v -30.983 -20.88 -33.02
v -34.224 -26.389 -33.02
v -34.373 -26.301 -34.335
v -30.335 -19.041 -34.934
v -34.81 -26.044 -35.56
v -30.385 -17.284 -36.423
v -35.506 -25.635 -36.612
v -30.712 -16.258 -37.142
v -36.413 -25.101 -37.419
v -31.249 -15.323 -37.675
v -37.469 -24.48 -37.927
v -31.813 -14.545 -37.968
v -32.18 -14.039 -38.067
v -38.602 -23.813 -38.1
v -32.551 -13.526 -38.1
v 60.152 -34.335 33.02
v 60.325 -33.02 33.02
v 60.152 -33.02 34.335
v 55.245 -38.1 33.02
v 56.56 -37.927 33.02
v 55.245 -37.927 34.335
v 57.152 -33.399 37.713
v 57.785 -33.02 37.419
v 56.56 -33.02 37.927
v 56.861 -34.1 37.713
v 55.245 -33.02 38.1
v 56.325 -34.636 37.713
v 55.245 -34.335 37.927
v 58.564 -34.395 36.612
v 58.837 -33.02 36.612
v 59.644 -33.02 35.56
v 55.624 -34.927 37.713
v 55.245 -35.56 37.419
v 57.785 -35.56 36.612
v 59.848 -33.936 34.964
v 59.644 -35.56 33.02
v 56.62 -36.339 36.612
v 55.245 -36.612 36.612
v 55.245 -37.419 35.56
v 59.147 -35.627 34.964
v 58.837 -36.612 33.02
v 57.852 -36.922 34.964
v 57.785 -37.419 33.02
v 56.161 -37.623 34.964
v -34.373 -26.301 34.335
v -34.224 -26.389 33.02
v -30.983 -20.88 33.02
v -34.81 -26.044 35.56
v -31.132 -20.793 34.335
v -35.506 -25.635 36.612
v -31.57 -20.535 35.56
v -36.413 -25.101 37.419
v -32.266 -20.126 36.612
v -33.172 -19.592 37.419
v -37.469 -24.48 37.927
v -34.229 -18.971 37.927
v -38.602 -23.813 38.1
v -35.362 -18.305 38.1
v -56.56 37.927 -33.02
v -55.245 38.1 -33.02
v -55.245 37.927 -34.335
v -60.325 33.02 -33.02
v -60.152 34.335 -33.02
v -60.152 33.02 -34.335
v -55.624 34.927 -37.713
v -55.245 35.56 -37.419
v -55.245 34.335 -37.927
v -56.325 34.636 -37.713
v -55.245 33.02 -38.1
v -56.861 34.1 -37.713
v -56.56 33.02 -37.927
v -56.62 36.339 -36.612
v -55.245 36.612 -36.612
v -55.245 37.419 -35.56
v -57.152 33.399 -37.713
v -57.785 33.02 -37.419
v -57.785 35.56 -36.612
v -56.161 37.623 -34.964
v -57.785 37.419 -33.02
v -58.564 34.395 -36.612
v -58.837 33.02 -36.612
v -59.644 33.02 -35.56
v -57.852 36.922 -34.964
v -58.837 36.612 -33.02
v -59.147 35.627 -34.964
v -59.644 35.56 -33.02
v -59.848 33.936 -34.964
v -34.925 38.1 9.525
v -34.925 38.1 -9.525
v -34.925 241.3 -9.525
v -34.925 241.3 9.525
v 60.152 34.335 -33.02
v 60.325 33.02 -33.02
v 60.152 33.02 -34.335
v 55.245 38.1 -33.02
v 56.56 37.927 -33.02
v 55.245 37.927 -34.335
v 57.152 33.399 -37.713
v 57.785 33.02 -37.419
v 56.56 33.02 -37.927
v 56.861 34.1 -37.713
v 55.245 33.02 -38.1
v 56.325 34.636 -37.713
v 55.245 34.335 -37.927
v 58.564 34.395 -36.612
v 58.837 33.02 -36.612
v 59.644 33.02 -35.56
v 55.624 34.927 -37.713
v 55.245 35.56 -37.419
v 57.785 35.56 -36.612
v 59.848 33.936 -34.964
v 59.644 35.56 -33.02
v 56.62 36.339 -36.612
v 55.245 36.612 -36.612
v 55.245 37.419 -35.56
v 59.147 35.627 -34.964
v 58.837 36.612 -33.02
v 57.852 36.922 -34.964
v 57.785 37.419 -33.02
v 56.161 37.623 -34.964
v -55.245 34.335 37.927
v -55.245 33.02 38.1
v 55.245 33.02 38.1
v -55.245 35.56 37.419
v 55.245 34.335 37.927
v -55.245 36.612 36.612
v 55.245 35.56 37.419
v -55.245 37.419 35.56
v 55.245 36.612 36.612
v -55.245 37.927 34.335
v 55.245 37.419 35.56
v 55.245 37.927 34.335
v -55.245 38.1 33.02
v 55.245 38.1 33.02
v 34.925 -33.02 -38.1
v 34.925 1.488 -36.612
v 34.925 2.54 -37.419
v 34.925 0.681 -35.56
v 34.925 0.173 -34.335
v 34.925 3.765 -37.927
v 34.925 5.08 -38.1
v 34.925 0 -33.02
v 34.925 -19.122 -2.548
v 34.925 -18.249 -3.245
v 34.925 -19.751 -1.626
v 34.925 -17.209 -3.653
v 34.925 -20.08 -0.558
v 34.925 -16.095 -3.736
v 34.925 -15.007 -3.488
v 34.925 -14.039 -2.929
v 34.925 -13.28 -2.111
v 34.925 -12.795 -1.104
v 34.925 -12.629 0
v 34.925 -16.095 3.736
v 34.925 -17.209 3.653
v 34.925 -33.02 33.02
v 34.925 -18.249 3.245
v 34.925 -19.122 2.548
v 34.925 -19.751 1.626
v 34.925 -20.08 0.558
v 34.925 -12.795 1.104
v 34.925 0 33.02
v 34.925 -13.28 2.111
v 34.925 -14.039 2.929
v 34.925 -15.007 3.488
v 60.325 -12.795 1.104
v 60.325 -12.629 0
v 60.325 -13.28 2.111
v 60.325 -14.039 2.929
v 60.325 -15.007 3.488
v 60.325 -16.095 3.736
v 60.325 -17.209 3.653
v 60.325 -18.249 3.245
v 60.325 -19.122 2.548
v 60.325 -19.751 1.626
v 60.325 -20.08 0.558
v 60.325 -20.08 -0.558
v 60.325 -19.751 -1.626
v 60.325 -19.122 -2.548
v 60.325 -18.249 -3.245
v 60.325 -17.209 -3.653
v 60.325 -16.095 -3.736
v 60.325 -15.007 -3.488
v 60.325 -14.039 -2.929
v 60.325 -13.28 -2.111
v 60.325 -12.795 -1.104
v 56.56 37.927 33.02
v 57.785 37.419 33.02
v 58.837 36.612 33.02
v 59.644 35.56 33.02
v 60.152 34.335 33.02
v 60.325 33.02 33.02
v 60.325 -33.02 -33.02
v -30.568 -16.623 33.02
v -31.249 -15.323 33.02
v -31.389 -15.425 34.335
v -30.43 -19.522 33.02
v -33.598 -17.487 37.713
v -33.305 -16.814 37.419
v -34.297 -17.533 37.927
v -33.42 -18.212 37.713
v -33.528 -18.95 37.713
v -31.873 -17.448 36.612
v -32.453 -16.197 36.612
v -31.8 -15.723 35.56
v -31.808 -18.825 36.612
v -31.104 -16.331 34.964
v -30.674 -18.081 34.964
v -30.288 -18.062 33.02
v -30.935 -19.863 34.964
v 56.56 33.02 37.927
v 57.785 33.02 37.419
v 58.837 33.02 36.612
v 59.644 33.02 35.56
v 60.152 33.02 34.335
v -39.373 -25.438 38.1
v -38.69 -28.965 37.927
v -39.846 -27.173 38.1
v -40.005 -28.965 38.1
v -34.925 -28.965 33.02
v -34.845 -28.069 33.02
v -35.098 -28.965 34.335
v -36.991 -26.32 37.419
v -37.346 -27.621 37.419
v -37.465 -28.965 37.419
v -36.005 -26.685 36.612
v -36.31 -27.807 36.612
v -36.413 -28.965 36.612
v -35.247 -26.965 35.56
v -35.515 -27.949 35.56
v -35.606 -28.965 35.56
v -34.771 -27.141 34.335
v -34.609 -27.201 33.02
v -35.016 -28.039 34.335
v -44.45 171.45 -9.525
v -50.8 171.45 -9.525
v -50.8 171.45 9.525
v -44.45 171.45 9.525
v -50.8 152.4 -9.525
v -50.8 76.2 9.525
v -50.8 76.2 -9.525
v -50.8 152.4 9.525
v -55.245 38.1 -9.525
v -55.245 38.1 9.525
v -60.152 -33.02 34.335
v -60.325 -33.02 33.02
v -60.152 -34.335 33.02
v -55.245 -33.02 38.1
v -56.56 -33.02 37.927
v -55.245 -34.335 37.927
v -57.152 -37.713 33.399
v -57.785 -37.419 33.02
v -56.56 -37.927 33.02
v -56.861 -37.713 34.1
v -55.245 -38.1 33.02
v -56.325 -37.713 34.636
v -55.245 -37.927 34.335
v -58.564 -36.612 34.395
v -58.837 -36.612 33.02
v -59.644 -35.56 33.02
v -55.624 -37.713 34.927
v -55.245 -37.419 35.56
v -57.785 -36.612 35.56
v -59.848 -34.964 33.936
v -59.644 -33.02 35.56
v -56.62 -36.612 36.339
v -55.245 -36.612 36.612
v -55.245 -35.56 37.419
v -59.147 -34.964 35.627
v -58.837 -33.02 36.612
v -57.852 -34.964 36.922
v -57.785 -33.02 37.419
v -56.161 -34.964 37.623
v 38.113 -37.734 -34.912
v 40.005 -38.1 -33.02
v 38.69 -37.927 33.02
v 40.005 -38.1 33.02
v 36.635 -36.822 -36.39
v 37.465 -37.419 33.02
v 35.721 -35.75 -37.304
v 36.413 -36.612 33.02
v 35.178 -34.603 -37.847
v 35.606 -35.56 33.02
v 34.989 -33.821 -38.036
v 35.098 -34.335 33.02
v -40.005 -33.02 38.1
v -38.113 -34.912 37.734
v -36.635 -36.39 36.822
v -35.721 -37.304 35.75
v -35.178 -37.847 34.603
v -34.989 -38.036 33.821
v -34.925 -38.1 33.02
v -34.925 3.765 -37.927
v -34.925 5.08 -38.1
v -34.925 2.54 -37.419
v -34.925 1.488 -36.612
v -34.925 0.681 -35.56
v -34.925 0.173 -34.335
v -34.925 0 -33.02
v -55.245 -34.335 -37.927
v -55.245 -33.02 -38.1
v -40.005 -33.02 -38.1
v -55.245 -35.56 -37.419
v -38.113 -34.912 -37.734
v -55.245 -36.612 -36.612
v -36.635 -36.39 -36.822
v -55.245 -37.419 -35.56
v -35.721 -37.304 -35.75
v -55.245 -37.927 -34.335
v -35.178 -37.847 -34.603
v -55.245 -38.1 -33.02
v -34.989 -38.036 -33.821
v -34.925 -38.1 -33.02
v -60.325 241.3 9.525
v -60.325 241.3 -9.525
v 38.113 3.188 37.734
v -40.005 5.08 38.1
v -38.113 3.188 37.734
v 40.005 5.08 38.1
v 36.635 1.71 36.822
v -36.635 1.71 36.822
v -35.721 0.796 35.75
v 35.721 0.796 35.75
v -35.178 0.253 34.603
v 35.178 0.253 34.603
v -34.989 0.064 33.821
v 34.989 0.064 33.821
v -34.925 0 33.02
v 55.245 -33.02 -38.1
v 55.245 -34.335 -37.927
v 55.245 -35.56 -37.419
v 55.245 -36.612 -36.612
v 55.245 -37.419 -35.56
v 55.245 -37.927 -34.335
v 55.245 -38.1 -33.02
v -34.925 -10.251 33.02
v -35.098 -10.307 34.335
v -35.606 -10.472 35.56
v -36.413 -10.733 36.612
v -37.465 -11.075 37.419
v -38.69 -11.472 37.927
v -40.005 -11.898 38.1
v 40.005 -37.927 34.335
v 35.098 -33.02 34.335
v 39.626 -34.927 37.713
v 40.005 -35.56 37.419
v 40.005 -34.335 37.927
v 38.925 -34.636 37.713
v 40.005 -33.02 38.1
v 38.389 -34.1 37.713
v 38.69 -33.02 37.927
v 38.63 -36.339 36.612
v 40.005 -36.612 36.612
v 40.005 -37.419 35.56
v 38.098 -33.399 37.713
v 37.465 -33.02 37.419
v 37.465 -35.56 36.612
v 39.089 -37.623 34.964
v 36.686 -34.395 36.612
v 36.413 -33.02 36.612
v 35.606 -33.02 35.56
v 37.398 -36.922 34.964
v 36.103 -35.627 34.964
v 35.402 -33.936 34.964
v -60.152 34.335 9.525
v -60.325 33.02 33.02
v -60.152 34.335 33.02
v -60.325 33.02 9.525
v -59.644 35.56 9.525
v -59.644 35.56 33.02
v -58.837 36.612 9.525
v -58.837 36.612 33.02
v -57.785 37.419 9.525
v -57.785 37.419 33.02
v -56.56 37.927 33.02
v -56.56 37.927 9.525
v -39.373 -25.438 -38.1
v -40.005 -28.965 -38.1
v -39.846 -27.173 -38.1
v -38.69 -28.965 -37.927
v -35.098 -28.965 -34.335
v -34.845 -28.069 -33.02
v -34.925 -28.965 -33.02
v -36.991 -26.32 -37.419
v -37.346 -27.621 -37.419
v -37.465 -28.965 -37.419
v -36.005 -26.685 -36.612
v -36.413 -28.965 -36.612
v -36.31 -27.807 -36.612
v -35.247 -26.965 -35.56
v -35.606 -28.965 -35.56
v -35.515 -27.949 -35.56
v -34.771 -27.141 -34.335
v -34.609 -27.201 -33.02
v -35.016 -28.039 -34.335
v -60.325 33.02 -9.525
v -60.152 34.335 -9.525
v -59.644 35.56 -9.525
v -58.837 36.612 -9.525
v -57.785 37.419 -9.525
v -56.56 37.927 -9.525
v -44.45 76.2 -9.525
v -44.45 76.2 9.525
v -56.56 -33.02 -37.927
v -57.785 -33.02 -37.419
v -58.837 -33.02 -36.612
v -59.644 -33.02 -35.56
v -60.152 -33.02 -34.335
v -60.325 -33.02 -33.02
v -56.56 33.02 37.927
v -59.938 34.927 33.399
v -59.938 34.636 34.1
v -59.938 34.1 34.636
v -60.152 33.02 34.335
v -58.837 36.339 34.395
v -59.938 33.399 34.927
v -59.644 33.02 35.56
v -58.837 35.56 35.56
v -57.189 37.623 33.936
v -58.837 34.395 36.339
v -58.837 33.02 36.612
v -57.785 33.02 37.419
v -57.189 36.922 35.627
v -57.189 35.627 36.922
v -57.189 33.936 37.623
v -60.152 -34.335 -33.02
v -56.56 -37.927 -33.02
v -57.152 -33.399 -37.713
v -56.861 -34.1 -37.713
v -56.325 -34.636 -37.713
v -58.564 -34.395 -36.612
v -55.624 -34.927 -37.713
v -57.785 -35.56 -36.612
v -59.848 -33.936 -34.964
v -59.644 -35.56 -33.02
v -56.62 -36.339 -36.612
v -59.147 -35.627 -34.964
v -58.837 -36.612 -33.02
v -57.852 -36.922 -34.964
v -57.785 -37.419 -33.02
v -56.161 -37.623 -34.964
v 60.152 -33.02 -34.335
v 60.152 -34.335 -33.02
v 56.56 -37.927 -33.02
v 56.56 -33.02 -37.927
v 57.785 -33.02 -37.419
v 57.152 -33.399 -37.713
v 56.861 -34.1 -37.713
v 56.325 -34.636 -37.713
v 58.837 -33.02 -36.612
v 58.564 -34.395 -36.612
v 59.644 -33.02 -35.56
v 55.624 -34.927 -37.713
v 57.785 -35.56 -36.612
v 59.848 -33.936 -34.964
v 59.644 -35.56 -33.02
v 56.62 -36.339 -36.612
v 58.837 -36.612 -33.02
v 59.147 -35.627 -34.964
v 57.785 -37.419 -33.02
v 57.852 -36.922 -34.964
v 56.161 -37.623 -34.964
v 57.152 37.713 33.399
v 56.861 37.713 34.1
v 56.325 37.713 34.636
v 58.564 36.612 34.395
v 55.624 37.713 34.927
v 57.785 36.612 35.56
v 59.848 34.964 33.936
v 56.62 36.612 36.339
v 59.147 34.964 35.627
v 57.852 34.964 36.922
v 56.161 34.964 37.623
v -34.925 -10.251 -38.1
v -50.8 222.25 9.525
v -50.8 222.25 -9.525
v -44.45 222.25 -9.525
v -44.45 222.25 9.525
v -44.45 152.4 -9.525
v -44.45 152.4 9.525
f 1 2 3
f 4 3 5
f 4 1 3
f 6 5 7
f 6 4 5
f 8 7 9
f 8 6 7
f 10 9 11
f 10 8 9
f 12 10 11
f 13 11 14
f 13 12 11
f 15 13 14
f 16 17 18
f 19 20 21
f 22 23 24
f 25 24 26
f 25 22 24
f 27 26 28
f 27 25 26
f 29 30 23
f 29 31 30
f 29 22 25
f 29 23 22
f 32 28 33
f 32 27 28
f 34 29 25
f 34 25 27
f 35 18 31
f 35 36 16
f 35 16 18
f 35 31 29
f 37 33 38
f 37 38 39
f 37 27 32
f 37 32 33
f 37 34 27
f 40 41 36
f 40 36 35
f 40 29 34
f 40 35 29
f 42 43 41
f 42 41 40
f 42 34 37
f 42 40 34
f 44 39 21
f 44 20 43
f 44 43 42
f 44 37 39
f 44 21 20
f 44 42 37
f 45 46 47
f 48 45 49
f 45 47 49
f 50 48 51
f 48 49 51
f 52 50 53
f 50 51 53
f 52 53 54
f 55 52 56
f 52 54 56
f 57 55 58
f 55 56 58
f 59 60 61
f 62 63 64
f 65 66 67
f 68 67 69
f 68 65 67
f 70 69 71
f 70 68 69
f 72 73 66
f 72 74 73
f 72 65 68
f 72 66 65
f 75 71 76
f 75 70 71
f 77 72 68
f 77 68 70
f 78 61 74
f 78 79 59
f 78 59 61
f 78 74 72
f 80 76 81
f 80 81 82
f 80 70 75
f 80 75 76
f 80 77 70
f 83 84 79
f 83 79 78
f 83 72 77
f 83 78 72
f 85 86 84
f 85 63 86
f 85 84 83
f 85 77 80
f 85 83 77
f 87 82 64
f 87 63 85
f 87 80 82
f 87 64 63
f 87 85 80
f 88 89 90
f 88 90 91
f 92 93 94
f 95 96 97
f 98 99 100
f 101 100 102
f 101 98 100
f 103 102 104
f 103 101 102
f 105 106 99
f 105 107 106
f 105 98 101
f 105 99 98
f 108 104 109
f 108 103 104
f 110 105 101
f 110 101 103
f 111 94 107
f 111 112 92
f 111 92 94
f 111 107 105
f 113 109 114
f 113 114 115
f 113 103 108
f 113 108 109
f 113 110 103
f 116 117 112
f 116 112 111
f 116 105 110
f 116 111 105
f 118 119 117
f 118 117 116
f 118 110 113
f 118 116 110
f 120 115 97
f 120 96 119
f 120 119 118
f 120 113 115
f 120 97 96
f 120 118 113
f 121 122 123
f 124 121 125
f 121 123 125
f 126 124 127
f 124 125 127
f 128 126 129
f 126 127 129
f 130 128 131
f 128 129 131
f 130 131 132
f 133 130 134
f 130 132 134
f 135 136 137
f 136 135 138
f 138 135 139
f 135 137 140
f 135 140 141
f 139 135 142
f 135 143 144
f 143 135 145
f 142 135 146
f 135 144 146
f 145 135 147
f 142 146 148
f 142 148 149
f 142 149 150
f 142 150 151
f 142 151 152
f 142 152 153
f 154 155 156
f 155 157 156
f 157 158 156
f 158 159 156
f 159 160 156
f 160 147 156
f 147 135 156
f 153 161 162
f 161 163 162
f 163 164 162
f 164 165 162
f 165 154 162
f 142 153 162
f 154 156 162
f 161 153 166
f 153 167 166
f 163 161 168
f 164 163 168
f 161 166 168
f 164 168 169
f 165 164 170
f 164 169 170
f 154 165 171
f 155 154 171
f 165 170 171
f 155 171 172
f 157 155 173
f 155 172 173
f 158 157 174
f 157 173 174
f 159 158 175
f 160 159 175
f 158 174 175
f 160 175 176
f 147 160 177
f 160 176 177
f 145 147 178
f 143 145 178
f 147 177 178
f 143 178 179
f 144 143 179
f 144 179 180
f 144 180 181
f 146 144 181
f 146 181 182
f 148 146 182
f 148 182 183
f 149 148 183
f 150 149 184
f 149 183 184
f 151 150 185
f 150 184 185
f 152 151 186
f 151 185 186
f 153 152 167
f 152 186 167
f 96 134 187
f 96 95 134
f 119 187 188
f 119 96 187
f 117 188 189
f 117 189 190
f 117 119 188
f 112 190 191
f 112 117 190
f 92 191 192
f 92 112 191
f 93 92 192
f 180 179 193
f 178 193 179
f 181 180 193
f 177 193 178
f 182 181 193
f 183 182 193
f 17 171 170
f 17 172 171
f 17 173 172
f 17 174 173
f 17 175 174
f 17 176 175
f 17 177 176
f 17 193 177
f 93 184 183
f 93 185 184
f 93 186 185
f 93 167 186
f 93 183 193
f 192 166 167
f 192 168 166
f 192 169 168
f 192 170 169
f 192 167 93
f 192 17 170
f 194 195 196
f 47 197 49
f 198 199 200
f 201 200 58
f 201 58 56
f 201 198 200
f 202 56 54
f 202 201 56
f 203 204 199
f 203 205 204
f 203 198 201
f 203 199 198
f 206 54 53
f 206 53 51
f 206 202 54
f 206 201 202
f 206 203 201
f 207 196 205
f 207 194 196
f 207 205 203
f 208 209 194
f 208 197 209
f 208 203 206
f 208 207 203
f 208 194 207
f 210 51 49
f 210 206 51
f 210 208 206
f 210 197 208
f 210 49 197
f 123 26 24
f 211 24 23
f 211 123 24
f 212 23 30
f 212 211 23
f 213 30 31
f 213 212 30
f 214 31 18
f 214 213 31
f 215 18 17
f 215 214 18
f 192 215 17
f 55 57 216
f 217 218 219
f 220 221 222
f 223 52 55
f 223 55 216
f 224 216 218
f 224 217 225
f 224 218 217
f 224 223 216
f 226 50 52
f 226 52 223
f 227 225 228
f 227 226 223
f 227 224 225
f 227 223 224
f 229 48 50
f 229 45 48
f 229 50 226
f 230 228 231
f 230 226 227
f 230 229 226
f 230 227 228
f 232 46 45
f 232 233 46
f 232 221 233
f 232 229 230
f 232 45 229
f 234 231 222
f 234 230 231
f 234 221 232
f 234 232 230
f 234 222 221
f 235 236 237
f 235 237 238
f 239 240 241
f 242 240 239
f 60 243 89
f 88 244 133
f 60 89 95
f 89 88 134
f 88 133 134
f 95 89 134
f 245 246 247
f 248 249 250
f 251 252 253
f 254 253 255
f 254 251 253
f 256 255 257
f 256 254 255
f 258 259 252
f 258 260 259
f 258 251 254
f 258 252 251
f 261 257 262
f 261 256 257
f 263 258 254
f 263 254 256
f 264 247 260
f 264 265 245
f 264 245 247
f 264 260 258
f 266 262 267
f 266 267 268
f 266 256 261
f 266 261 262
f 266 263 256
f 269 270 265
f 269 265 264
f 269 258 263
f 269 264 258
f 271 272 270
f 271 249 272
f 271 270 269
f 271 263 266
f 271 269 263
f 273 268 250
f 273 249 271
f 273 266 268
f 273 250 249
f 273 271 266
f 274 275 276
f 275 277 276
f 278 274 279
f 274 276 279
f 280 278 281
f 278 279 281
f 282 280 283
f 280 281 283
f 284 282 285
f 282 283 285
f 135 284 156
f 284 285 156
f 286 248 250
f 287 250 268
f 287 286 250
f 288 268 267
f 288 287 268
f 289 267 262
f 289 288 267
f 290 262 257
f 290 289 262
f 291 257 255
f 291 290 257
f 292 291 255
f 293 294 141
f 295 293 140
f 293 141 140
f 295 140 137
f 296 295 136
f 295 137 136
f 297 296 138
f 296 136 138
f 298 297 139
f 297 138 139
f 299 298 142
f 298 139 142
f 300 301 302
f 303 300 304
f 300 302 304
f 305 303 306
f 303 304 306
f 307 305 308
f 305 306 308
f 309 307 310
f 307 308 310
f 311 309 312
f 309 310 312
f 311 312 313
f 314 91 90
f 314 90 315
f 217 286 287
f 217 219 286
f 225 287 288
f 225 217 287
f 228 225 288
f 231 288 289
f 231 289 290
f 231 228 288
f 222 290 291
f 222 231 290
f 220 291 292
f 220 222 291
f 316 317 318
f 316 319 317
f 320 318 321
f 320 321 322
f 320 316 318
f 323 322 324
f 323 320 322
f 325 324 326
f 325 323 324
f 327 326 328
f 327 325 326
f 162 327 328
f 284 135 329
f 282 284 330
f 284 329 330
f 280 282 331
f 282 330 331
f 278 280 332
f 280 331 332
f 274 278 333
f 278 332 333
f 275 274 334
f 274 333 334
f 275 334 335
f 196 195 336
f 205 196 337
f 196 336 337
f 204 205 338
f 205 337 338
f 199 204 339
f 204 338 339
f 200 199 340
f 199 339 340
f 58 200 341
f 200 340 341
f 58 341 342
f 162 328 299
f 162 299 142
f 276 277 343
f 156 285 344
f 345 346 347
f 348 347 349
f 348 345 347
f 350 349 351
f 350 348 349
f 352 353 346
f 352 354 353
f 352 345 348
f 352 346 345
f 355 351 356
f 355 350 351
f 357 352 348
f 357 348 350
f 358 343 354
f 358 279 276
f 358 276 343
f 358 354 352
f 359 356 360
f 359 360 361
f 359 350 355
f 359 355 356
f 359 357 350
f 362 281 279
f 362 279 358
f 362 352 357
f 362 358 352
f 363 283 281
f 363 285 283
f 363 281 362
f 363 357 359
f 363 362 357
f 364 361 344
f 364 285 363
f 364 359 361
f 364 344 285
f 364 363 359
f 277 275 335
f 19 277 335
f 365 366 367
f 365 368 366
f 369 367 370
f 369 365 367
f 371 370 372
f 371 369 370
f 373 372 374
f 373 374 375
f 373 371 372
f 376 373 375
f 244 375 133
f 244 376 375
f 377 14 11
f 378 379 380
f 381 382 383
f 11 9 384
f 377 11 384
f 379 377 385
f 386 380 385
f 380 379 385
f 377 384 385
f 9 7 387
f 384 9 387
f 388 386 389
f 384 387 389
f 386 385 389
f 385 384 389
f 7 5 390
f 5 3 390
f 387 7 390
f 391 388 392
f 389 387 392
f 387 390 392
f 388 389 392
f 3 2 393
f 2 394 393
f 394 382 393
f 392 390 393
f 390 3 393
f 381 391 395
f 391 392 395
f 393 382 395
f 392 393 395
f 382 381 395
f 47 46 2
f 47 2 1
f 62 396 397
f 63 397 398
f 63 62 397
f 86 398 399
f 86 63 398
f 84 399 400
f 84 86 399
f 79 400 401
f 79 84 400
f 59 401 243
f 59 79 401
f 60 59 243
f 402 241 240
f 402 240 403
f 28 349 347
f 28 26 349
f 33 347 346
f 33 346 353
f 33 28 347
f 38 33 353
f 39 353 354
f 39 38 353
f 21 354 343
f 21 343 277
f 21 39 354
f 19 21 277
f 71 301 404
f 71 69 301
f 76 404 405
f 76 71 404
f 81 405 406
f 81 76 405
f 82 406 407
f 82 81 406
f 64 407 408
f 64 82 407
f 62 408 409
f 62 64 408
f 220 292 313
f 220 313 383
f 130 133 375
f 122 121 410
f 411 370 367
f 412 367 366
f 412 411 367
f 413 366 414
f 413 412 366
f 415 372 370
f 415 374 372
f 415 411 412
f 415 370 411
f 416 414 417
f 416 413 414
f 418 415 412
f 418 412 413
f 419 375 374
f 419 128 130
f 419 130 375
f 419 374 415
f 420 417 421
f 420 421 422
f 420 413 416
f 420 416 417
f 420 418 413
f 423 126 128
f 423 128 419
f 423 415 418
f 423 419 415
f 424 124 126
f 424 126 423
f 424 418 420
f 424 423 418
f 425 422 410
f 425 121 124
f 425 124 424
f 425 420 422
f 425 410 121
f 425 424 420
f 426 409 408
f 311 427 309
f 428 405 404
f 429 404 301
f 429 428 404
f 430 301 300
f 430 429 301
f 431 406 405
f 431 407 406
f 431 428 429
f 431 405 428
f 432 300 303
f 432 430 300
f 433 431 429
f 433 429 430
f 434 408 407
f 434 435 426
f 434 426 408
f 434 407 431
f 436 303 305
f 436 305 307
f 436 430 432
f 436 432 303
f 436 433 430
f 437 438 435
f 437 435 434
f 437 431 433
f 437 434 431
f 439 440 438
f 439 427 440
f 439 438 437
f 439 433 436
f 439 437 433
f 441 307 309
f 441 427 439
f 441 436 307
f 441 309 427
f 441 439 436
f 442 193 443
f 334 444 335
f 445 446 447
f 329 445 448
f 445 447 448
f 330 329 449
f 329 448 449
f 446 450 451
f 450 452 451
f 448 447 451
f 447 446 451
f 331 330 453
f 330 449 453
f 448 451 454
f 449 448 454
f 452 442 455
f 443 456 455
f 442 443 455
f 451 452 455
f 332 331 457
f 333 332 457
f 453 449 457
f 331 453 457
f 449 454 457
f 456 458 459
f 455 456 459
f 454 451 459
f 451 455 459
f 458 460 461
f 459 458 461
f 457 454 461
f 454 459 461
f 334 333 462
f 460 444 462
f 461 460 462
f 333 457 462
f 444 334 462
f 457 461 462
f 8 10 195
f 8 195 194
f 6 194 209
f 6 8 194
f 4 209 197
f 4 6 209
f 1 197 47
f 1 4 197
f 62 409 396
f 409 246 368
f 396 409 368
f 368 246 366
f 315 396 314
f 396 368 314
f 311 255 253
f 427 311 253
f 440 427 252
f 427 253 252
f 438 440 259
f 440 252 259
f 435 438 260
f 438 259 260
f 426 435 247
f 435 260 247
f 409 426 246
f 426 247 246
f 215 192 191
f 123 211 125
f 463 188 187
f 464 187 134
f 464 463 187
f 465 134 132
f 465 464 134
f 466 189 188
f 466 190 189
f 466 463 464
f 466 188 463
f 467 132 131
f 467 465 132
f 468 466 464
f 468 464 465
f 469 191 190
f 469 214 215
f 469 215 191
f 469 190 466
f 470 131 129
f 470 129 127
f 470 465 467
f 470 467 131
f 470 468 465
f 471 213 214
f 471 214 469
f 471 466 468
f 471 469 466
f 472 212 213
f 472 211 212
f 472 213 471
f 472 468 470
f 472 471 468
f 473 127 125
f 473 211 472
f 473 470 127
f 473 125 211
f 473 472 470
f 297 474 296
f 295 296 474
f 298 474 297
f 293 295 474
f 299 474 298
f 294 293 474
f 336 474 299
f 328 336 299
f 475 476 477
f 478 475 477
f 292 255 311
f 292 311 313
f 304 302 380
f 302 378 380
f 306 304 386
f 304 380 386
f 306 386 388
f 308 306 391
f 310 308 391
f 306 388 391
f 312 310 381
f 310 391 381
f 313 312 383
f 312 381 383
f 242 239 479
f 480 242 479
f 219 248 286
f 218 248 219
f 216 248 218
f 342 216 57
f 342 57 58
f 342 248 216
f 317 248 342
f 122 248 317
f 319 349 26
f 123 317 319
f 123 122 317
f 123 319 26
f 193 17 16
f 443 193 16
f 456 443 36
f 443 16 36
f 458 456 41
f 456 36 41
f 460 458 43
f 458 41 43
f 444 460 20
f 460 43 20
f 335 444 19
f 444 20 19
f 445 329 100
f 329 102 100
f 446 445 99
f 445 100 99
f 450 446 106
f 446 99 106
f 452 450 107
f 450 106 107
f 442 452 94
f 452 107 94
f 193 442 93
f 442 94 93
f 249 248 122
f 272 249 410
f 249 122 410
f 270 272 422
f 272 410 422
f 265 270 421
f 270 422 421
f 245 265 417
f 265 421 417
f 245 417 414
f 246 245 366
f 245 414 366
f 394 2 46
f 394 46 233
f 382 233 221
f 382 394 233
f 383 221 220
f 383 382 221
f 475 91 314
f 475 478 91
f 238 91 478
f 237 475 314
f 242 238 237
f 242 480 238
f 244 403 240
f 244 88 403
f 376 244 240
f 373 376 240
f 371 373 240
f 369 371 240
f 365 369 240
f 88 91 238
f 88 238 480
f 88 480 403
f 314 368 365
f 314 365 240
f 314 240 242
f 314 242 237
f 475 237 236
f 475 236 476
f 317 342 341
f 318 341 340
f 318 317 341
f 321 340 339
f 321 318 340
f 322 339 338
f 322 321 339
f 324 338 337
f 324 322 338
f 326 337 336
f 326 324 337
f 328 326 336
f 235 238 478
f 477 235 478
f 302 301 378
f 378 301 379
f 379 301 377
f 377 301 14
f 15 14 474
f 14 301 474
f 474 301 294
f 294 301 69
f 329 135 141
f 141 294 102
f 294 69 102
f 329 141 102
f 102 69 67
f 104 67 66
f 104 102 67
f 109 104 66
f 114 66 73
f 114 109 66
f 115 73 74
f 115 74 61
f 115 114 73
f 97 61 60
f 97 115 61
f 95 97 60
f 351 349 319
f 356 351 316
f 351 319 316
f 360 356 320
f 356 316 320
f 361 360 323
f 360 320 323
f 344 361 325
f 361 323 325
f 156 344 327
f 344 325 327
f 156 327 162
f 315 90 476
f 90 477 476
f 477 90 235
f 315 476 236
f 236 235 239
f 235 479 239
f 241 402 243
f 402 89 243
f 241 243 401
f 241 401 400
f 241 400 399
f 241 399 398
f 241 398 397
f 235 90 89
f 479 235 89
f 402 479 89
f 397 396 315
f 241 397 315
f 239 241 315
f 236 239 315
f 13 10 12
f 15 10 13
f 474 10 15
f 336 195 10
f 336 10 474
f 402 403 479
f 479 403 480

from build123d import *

# Parameters (mm, degrees)
F0_W      = 120.65
F0_H      = 76.2
F2_DEPTH  = 38.1
F1_W      = 69.85
F1_H      = 101.6
F3_DEPTH  = 38.1
F4_R      = 3.7467551061
F5_DEPTH  = 38.1
F6_W      = 25.4
F6_H      = 19.05
F7_DEPTH  = 203.2
F8_W      = 6.35
F8_H      = 50.8
F8_H_2    = 76.2
F9_DEPTH  = 47.626
F11_DEPTH = 38.1
F12_R     = 5.08


with BuildPart() as f2:
    # F0 (on Top) → F2 (new body, symmetric)
    with BuildSketch(Plane.XY):
        Rectangle(F0_W, F0_H)
    extrude(amount=F2_DEPTH, both=True)

    # F1 (on face) → F3 (cut, symmetric)
    with BuildSketch(Plane.XY):
        with Locations((0, -50.8)):
            Rectangle(F1_W, F1_H)
    extrude(amount=F3_DEPTH, both=True, mode=Mode.SUBTRACT)

    # F4 (on face) → F5 (cut, symmetric)
    with BuildSketch(Plane.YZ.offset(60.325)):
        with Locations((-16.3753926754, 0)):
            Circle(F4_R)
    extrude(amount=F5_DEPTH, both=True, mode=Mode.SUBTRACT)

    # F6 (on face) → F7 (join)
    with BuildSketch(Plane(origin=(0, 38.1, 0), x_dir=(-1, 0, 0), z_dir=(0, 1, 0))):
        with Locations((47.625, 0)):
            Rectangle(F6_W, F6_H)
    extrude(amount=F7_DEPTH)

    # F8 (on face) → F9 (cut, through all)
    with BuildSketch(Plane.XY.offset(9.525)):
        with Locations((-47.625, 196.85)):
            Rectangle(F8_W, F8_H)
        with Locations((-47.625, 114.3)):
            Rectangle(F8_W, F8_H_2)
    extrude(amount=-F9_DEPTH, mode=Mode.SUBTRACT)

    # F10 (on Top) → F11 (join, symmetric)
    with BuildSketch(Plane.XY):
        Polygon((-29.2977448553, -18.0150475353), (-34.9880978465, -10.1638017222), (-35.0601263344, -27.8110988438), align=None)
    extrude(amount=F11_DEPTH, both=True)

    # F12
    f12_edges = [f2.edges().sort_by_distance(p)[0] for p in [
        (60.325, -38.1, 0),
        (60.325, 0, 38.1),
        (60.325, 38.1, 0),
        (60.325, 0, -38.1),
        (0, 38.1, 38.1),
        (-60.325, 38.1, 23.8125),
        (-60.325, 38.1, -23.8125),
        (0, 38.1, -38.1),
        (-60.325, 0, 38.1),
        (-60.325, -38.1, 0),
        (-60.325, 0, -38.1),
        (34.925, -38.1, 0),
        (-34.925, -27.581384, 0),
        (-32.111372, -22.798216, 38.1),
        (-29.297745, -18.015048, 0),
        (-32.111372, -22.798216, -38.1),
        (0, 0, 38.1),
        (0, 0, -38.1),
        (47.625, -38.1, 38.1),
        (47.625, -38.1, -38.1),
        (-47.625, -38.1, 38.1),
        (-47.625, -38.1, -38.1),
        (-34.925, -5.12543, 38.1),
        (-32.111372, -14.132954, 38.1),
        (-34.925, -32.840692, 38.1),
        (34.925, -19.05, 38.1),
        (-34.925, -32.840692, -38.1),
    ]]
    fillet(f12_edges, radius=F12_R)


solid = f2.part
